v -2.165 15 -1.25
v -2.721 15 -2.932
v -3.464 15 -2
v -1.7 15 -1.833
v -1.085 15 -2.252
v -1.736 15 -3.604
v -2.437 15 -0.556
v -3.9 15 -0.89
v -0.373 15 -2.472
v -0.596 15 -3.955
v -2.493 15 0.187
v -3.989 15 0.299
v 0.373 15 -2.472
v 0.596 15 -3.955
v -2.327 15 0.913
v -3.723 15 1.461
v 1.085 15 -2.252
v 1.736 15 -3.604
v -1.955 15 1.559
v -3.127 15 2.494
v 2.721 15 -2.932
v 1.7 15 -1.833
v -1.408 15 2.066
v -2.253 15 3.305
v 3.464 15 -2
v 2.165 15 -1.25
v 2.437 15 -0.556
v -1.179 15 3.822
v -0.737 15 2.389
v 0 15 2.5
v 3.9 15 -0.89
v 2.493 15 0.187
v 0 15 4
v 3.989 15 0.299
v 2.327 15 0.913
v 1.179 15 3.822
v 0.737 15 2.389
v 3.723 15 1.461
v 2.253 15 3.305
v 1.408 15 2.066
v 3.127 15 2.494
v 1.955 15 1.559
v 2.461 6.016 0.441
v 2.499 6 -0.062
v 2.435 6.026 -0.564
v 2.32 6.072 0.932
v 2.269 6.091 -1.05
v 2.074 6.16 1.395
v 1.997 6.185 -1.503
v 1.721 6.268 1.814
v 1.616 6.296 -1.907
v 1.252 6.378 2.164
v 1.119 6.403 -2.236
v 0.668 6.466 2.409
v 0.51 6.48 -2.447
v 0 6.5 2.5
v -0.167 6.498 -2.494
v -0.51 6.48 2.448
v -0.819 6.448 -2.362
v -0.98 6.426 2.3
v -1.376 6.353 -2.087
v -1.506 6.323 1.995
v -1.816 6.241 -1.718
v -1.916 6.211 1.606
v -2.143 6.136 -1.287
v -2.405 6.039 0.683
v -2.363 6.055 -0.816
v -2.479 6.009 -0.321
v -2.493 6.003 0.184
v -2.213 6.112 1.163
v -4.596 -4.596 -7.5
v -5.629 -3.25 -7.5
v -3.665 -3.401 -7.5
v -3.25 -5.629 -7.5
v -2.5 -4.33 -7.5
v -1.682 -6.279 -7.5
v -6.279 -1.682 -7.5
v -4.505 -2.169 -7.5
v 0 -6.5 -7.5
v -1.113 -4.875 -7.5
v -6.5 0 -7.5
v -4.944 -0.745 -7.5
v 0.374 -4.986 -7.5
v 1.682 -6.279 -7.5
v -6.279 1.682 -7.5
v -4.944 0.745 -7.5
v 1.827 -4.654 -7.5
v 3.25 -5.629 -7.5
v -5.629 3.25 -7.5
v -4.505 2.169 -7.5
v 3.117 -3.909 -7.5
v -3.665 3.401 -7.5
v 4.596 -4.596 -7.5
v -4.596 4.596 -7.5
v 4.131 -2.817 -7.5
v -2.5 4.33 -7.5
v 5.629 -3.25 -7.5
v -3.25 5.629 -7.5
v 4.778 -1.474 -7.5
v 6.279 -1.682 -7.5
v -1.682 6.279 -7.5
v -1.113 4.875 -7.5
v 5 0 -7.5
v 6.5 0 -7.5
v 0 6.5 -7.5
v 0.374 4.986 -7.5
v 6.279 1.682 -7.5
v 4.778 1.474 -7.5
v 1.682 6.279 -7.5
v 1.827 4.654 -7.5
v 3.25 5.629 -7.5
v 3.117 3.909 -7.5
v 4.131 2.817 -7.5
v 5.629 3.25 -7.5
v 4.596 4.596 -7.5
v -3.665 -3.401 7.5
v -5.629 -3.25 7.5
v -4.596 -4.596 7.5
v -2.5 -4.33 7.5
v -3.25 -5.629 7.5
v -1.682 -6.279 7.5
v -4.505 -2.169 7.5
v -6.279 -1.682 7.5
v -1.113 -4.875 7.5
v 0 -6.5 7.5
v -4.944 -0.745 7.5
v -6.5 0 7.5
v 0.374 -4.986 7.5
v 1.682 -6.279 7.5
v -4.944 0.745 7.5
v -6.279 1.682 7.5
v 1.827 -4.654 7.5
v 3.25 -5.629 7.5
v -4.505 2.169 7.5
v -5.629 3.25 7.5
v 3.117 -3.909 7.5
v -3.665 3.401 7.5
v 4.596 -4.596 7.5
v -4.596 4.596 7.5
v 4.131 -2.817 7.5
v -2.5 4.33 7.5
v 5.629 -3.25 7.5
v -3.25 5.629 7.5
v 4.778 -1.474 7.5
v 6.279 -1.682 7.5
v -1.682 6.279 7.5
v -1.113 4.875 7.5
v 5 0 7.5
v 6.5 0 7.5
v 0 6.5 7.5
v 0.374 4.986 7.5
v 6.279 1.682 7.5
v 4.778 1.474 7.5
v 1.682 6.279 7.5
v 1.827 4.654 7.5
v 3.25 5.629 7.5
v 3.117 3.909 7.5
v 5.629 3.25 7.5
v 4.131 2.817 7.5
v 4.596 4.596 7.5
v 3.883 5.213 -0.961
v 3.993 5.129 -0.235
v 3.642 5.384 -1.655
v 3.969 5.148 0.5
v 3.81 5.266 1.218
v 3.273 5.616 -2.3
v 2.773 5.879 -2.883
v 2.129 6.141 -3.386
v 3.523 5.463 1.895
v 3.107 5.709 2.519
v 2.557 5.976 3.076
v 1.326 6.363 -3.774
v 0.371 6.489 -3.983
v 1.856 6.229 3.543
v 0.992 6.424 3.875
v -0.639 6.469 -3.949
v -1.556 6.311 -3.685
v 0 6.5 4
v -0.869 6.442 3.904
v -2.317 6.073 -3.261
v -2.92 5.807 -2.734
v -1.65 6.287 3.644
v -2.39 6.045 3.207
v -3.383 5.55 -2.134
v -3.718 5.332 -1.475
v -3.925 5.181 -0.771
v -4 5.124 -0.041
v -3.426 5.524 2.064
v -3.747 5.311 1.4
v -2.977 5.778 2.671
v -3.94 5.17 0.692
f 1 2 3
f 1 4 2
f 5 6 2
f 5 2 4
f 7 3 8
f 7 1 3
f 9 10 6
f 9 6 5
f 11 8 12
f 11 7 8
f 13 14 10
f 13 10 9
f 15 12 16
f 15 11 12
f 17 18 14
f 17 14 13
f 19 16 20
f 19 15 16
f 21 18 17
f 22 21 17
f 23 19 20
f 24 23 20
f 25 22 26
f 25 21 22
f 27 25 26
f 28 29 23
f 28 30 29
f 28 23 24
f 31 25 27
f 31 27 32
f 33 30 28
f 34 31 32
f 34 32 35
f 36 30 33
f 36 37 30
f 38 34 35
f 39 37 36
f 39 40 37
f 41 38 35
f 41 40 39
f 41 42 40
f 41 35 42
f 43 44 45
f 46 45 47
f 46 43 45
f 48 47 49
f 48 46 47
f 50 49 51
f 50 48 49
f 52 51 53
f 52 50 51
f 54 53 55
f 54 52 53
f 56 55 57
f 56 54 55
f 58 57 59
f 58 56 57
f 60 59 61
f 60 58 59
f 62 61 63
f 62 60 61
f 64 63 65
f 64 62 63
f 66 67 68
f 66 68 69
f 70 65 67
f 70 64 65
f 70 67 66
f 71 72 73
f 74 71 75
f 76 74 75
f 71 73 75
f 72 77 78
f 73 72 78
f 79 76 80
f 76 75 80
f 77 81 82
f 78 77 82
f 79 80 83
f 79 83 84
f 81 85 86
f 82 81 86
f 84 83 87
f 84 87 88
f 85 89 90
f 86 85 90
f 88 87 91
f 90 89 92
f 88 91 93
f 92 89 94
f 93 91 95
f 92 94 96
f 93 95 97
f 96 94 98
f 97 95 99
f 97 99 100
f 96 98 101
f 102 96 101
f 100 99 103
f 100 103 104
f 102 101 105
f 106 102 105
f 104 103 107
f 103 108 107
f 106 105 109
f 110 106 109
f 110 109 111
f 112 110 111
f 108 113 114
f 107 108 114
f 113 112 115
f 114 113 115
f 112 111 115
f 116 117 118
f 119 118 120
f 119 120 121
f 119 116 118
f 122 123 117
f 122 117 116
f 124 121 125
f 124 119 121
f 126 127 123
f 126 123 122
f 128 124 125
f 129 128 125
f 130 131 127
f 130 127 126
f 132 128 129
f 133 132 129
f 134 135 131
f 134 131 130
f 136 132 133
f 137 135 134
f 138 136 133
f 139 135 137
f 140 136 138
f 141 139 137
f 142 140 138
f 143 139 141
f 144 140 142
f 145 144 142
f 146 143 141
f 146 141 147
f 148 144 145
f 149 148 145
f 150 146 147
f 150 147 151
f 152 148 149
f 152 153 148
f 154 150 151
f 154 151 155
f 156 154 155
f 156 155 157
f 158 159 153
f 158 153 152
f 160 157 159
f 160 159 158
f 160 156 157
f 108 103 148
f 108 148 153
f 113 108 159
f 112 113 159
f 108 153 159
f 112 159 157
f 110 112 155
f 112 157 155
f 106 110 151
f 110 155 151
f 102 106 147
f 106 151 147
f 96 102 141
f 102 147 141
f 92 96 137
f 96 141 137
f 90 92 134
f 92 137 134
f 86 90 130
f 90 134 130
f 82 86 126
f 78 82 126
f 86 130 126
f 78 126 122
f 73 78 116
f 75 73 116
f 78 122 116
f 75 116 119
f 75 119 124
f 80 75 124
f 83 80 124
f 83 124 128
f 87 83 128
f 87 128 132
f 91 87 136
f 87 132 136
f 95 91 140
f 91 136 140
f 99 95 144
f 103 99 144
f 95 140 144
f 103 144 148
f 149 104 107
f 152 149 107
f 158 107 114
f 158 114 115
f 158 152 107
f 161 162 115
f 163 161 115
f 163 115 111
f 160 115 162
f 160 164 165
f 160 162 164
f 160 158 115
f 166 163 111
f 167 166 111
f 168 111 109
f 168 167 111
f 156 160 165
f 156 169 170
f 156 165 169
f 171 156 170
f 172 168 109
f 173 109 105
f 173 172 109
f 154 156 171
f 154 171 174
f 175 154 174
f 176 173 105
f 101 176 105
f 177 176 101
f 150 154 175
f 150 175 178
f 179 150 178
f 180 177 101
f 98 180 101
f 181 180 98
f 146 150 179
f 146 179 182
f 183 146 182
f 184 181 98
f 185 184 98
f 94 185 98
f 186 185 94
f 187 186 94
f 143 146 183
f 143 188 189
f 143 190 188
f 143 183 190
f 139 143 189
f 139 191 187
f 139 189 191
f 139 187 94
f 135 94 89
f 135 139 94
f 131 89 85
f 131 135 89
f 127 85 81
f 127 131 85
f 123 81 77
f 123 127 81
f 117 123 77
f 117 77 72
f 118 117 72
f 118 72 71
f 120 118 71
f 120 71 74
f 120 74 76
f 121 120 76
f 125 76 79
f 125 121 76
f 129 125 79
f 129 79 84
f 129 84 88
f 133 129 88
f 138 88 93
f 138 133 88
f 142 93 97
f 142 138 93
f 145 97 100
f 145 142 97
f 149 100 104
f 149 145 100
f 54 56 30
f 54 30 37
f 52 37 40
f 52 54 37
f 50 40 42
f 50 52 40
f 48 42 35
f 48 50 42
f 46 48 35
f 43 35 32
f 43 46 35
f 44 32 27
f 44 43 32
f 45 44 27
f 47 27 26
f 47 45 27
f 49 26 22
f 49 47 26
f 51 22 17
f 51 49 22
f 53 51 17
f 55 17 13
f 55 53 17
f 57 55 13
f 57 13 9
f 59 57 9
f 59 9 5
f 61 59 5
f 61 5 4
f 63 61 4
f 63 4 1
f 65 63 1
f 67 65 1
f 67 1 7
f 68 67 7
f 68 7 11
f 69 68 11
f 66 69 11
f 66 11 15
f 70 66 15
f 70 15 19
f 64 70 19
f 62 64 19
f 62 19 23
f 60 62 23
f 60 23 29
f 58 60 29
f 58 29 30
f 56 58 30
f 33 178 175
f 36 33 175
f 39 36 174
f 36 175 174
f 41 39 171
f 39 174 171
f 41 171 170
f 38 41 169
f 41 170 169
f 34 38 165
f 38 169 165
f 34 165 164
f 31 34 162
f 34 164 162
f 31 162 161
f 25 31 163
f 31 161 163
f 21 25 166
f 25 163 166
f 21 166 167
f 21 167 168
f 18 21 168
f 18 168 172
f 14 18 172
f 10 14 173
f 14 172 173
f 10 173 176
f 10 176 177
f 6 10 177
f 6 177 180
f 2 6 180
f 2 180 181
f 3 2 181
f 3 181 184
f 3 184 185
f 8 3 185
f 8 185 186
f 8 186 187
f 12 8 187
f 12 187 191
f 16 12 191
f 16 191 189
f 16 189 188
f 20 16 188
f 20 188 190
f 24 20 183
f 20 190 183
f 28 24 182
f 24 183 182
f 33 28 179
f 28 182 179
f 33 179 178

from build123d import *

# Parameters (mm, degrees)
SKETCH1_R           = 4
SKETCH1_R_2         = 2.5
BOSS_EXTRUDE1_DEPTH = 15
SKETCH2_R           = 6.5
BOSS_EXTRUDE3_DEPTH = 7.5
SKETCH3_R           = 5
CUT_EXTRUDE1_DEPTH  = 15


with BuildPart() as part:
    # Sketch1 → Boss-Extrude1 (new body)
    with BuildSketch(Plane(origin=(0, 0, 0), x_dir=(1, 0, 0), z_dir=(0, 1, 0))):
        with Locations(Location((0, 0, 0), (0, 0, 270))):
            Circle(SKETCH1_R)
        with Locations(Location((0, 0, 0), (0, 0, 270))):
            Circle(SKETCH1_R_2, mode=Mode.SUBTRACT)
    extrude(amount=BOSS_EXTRUDE1_DEPTH)

    # Sketch2 → Boss-Extrude3 (add, symmetric)
    with BuildSketch(Plane.XY):
        Circle(SKETCH2_R)
    extrude(amount=BOSS_EXTRUDE3_DEPTH, both=True)

    # Sketch3 → Cut-Extrude1 (cut)
    with BuildSketch(Plane.XY.offset(7.5)):
        Circle(SKETCH3_R)
    extrude(amount=-CUT_EXTRUDE1_DEPTH, mode=Mode.SUBTRACT)


solid = part.part
